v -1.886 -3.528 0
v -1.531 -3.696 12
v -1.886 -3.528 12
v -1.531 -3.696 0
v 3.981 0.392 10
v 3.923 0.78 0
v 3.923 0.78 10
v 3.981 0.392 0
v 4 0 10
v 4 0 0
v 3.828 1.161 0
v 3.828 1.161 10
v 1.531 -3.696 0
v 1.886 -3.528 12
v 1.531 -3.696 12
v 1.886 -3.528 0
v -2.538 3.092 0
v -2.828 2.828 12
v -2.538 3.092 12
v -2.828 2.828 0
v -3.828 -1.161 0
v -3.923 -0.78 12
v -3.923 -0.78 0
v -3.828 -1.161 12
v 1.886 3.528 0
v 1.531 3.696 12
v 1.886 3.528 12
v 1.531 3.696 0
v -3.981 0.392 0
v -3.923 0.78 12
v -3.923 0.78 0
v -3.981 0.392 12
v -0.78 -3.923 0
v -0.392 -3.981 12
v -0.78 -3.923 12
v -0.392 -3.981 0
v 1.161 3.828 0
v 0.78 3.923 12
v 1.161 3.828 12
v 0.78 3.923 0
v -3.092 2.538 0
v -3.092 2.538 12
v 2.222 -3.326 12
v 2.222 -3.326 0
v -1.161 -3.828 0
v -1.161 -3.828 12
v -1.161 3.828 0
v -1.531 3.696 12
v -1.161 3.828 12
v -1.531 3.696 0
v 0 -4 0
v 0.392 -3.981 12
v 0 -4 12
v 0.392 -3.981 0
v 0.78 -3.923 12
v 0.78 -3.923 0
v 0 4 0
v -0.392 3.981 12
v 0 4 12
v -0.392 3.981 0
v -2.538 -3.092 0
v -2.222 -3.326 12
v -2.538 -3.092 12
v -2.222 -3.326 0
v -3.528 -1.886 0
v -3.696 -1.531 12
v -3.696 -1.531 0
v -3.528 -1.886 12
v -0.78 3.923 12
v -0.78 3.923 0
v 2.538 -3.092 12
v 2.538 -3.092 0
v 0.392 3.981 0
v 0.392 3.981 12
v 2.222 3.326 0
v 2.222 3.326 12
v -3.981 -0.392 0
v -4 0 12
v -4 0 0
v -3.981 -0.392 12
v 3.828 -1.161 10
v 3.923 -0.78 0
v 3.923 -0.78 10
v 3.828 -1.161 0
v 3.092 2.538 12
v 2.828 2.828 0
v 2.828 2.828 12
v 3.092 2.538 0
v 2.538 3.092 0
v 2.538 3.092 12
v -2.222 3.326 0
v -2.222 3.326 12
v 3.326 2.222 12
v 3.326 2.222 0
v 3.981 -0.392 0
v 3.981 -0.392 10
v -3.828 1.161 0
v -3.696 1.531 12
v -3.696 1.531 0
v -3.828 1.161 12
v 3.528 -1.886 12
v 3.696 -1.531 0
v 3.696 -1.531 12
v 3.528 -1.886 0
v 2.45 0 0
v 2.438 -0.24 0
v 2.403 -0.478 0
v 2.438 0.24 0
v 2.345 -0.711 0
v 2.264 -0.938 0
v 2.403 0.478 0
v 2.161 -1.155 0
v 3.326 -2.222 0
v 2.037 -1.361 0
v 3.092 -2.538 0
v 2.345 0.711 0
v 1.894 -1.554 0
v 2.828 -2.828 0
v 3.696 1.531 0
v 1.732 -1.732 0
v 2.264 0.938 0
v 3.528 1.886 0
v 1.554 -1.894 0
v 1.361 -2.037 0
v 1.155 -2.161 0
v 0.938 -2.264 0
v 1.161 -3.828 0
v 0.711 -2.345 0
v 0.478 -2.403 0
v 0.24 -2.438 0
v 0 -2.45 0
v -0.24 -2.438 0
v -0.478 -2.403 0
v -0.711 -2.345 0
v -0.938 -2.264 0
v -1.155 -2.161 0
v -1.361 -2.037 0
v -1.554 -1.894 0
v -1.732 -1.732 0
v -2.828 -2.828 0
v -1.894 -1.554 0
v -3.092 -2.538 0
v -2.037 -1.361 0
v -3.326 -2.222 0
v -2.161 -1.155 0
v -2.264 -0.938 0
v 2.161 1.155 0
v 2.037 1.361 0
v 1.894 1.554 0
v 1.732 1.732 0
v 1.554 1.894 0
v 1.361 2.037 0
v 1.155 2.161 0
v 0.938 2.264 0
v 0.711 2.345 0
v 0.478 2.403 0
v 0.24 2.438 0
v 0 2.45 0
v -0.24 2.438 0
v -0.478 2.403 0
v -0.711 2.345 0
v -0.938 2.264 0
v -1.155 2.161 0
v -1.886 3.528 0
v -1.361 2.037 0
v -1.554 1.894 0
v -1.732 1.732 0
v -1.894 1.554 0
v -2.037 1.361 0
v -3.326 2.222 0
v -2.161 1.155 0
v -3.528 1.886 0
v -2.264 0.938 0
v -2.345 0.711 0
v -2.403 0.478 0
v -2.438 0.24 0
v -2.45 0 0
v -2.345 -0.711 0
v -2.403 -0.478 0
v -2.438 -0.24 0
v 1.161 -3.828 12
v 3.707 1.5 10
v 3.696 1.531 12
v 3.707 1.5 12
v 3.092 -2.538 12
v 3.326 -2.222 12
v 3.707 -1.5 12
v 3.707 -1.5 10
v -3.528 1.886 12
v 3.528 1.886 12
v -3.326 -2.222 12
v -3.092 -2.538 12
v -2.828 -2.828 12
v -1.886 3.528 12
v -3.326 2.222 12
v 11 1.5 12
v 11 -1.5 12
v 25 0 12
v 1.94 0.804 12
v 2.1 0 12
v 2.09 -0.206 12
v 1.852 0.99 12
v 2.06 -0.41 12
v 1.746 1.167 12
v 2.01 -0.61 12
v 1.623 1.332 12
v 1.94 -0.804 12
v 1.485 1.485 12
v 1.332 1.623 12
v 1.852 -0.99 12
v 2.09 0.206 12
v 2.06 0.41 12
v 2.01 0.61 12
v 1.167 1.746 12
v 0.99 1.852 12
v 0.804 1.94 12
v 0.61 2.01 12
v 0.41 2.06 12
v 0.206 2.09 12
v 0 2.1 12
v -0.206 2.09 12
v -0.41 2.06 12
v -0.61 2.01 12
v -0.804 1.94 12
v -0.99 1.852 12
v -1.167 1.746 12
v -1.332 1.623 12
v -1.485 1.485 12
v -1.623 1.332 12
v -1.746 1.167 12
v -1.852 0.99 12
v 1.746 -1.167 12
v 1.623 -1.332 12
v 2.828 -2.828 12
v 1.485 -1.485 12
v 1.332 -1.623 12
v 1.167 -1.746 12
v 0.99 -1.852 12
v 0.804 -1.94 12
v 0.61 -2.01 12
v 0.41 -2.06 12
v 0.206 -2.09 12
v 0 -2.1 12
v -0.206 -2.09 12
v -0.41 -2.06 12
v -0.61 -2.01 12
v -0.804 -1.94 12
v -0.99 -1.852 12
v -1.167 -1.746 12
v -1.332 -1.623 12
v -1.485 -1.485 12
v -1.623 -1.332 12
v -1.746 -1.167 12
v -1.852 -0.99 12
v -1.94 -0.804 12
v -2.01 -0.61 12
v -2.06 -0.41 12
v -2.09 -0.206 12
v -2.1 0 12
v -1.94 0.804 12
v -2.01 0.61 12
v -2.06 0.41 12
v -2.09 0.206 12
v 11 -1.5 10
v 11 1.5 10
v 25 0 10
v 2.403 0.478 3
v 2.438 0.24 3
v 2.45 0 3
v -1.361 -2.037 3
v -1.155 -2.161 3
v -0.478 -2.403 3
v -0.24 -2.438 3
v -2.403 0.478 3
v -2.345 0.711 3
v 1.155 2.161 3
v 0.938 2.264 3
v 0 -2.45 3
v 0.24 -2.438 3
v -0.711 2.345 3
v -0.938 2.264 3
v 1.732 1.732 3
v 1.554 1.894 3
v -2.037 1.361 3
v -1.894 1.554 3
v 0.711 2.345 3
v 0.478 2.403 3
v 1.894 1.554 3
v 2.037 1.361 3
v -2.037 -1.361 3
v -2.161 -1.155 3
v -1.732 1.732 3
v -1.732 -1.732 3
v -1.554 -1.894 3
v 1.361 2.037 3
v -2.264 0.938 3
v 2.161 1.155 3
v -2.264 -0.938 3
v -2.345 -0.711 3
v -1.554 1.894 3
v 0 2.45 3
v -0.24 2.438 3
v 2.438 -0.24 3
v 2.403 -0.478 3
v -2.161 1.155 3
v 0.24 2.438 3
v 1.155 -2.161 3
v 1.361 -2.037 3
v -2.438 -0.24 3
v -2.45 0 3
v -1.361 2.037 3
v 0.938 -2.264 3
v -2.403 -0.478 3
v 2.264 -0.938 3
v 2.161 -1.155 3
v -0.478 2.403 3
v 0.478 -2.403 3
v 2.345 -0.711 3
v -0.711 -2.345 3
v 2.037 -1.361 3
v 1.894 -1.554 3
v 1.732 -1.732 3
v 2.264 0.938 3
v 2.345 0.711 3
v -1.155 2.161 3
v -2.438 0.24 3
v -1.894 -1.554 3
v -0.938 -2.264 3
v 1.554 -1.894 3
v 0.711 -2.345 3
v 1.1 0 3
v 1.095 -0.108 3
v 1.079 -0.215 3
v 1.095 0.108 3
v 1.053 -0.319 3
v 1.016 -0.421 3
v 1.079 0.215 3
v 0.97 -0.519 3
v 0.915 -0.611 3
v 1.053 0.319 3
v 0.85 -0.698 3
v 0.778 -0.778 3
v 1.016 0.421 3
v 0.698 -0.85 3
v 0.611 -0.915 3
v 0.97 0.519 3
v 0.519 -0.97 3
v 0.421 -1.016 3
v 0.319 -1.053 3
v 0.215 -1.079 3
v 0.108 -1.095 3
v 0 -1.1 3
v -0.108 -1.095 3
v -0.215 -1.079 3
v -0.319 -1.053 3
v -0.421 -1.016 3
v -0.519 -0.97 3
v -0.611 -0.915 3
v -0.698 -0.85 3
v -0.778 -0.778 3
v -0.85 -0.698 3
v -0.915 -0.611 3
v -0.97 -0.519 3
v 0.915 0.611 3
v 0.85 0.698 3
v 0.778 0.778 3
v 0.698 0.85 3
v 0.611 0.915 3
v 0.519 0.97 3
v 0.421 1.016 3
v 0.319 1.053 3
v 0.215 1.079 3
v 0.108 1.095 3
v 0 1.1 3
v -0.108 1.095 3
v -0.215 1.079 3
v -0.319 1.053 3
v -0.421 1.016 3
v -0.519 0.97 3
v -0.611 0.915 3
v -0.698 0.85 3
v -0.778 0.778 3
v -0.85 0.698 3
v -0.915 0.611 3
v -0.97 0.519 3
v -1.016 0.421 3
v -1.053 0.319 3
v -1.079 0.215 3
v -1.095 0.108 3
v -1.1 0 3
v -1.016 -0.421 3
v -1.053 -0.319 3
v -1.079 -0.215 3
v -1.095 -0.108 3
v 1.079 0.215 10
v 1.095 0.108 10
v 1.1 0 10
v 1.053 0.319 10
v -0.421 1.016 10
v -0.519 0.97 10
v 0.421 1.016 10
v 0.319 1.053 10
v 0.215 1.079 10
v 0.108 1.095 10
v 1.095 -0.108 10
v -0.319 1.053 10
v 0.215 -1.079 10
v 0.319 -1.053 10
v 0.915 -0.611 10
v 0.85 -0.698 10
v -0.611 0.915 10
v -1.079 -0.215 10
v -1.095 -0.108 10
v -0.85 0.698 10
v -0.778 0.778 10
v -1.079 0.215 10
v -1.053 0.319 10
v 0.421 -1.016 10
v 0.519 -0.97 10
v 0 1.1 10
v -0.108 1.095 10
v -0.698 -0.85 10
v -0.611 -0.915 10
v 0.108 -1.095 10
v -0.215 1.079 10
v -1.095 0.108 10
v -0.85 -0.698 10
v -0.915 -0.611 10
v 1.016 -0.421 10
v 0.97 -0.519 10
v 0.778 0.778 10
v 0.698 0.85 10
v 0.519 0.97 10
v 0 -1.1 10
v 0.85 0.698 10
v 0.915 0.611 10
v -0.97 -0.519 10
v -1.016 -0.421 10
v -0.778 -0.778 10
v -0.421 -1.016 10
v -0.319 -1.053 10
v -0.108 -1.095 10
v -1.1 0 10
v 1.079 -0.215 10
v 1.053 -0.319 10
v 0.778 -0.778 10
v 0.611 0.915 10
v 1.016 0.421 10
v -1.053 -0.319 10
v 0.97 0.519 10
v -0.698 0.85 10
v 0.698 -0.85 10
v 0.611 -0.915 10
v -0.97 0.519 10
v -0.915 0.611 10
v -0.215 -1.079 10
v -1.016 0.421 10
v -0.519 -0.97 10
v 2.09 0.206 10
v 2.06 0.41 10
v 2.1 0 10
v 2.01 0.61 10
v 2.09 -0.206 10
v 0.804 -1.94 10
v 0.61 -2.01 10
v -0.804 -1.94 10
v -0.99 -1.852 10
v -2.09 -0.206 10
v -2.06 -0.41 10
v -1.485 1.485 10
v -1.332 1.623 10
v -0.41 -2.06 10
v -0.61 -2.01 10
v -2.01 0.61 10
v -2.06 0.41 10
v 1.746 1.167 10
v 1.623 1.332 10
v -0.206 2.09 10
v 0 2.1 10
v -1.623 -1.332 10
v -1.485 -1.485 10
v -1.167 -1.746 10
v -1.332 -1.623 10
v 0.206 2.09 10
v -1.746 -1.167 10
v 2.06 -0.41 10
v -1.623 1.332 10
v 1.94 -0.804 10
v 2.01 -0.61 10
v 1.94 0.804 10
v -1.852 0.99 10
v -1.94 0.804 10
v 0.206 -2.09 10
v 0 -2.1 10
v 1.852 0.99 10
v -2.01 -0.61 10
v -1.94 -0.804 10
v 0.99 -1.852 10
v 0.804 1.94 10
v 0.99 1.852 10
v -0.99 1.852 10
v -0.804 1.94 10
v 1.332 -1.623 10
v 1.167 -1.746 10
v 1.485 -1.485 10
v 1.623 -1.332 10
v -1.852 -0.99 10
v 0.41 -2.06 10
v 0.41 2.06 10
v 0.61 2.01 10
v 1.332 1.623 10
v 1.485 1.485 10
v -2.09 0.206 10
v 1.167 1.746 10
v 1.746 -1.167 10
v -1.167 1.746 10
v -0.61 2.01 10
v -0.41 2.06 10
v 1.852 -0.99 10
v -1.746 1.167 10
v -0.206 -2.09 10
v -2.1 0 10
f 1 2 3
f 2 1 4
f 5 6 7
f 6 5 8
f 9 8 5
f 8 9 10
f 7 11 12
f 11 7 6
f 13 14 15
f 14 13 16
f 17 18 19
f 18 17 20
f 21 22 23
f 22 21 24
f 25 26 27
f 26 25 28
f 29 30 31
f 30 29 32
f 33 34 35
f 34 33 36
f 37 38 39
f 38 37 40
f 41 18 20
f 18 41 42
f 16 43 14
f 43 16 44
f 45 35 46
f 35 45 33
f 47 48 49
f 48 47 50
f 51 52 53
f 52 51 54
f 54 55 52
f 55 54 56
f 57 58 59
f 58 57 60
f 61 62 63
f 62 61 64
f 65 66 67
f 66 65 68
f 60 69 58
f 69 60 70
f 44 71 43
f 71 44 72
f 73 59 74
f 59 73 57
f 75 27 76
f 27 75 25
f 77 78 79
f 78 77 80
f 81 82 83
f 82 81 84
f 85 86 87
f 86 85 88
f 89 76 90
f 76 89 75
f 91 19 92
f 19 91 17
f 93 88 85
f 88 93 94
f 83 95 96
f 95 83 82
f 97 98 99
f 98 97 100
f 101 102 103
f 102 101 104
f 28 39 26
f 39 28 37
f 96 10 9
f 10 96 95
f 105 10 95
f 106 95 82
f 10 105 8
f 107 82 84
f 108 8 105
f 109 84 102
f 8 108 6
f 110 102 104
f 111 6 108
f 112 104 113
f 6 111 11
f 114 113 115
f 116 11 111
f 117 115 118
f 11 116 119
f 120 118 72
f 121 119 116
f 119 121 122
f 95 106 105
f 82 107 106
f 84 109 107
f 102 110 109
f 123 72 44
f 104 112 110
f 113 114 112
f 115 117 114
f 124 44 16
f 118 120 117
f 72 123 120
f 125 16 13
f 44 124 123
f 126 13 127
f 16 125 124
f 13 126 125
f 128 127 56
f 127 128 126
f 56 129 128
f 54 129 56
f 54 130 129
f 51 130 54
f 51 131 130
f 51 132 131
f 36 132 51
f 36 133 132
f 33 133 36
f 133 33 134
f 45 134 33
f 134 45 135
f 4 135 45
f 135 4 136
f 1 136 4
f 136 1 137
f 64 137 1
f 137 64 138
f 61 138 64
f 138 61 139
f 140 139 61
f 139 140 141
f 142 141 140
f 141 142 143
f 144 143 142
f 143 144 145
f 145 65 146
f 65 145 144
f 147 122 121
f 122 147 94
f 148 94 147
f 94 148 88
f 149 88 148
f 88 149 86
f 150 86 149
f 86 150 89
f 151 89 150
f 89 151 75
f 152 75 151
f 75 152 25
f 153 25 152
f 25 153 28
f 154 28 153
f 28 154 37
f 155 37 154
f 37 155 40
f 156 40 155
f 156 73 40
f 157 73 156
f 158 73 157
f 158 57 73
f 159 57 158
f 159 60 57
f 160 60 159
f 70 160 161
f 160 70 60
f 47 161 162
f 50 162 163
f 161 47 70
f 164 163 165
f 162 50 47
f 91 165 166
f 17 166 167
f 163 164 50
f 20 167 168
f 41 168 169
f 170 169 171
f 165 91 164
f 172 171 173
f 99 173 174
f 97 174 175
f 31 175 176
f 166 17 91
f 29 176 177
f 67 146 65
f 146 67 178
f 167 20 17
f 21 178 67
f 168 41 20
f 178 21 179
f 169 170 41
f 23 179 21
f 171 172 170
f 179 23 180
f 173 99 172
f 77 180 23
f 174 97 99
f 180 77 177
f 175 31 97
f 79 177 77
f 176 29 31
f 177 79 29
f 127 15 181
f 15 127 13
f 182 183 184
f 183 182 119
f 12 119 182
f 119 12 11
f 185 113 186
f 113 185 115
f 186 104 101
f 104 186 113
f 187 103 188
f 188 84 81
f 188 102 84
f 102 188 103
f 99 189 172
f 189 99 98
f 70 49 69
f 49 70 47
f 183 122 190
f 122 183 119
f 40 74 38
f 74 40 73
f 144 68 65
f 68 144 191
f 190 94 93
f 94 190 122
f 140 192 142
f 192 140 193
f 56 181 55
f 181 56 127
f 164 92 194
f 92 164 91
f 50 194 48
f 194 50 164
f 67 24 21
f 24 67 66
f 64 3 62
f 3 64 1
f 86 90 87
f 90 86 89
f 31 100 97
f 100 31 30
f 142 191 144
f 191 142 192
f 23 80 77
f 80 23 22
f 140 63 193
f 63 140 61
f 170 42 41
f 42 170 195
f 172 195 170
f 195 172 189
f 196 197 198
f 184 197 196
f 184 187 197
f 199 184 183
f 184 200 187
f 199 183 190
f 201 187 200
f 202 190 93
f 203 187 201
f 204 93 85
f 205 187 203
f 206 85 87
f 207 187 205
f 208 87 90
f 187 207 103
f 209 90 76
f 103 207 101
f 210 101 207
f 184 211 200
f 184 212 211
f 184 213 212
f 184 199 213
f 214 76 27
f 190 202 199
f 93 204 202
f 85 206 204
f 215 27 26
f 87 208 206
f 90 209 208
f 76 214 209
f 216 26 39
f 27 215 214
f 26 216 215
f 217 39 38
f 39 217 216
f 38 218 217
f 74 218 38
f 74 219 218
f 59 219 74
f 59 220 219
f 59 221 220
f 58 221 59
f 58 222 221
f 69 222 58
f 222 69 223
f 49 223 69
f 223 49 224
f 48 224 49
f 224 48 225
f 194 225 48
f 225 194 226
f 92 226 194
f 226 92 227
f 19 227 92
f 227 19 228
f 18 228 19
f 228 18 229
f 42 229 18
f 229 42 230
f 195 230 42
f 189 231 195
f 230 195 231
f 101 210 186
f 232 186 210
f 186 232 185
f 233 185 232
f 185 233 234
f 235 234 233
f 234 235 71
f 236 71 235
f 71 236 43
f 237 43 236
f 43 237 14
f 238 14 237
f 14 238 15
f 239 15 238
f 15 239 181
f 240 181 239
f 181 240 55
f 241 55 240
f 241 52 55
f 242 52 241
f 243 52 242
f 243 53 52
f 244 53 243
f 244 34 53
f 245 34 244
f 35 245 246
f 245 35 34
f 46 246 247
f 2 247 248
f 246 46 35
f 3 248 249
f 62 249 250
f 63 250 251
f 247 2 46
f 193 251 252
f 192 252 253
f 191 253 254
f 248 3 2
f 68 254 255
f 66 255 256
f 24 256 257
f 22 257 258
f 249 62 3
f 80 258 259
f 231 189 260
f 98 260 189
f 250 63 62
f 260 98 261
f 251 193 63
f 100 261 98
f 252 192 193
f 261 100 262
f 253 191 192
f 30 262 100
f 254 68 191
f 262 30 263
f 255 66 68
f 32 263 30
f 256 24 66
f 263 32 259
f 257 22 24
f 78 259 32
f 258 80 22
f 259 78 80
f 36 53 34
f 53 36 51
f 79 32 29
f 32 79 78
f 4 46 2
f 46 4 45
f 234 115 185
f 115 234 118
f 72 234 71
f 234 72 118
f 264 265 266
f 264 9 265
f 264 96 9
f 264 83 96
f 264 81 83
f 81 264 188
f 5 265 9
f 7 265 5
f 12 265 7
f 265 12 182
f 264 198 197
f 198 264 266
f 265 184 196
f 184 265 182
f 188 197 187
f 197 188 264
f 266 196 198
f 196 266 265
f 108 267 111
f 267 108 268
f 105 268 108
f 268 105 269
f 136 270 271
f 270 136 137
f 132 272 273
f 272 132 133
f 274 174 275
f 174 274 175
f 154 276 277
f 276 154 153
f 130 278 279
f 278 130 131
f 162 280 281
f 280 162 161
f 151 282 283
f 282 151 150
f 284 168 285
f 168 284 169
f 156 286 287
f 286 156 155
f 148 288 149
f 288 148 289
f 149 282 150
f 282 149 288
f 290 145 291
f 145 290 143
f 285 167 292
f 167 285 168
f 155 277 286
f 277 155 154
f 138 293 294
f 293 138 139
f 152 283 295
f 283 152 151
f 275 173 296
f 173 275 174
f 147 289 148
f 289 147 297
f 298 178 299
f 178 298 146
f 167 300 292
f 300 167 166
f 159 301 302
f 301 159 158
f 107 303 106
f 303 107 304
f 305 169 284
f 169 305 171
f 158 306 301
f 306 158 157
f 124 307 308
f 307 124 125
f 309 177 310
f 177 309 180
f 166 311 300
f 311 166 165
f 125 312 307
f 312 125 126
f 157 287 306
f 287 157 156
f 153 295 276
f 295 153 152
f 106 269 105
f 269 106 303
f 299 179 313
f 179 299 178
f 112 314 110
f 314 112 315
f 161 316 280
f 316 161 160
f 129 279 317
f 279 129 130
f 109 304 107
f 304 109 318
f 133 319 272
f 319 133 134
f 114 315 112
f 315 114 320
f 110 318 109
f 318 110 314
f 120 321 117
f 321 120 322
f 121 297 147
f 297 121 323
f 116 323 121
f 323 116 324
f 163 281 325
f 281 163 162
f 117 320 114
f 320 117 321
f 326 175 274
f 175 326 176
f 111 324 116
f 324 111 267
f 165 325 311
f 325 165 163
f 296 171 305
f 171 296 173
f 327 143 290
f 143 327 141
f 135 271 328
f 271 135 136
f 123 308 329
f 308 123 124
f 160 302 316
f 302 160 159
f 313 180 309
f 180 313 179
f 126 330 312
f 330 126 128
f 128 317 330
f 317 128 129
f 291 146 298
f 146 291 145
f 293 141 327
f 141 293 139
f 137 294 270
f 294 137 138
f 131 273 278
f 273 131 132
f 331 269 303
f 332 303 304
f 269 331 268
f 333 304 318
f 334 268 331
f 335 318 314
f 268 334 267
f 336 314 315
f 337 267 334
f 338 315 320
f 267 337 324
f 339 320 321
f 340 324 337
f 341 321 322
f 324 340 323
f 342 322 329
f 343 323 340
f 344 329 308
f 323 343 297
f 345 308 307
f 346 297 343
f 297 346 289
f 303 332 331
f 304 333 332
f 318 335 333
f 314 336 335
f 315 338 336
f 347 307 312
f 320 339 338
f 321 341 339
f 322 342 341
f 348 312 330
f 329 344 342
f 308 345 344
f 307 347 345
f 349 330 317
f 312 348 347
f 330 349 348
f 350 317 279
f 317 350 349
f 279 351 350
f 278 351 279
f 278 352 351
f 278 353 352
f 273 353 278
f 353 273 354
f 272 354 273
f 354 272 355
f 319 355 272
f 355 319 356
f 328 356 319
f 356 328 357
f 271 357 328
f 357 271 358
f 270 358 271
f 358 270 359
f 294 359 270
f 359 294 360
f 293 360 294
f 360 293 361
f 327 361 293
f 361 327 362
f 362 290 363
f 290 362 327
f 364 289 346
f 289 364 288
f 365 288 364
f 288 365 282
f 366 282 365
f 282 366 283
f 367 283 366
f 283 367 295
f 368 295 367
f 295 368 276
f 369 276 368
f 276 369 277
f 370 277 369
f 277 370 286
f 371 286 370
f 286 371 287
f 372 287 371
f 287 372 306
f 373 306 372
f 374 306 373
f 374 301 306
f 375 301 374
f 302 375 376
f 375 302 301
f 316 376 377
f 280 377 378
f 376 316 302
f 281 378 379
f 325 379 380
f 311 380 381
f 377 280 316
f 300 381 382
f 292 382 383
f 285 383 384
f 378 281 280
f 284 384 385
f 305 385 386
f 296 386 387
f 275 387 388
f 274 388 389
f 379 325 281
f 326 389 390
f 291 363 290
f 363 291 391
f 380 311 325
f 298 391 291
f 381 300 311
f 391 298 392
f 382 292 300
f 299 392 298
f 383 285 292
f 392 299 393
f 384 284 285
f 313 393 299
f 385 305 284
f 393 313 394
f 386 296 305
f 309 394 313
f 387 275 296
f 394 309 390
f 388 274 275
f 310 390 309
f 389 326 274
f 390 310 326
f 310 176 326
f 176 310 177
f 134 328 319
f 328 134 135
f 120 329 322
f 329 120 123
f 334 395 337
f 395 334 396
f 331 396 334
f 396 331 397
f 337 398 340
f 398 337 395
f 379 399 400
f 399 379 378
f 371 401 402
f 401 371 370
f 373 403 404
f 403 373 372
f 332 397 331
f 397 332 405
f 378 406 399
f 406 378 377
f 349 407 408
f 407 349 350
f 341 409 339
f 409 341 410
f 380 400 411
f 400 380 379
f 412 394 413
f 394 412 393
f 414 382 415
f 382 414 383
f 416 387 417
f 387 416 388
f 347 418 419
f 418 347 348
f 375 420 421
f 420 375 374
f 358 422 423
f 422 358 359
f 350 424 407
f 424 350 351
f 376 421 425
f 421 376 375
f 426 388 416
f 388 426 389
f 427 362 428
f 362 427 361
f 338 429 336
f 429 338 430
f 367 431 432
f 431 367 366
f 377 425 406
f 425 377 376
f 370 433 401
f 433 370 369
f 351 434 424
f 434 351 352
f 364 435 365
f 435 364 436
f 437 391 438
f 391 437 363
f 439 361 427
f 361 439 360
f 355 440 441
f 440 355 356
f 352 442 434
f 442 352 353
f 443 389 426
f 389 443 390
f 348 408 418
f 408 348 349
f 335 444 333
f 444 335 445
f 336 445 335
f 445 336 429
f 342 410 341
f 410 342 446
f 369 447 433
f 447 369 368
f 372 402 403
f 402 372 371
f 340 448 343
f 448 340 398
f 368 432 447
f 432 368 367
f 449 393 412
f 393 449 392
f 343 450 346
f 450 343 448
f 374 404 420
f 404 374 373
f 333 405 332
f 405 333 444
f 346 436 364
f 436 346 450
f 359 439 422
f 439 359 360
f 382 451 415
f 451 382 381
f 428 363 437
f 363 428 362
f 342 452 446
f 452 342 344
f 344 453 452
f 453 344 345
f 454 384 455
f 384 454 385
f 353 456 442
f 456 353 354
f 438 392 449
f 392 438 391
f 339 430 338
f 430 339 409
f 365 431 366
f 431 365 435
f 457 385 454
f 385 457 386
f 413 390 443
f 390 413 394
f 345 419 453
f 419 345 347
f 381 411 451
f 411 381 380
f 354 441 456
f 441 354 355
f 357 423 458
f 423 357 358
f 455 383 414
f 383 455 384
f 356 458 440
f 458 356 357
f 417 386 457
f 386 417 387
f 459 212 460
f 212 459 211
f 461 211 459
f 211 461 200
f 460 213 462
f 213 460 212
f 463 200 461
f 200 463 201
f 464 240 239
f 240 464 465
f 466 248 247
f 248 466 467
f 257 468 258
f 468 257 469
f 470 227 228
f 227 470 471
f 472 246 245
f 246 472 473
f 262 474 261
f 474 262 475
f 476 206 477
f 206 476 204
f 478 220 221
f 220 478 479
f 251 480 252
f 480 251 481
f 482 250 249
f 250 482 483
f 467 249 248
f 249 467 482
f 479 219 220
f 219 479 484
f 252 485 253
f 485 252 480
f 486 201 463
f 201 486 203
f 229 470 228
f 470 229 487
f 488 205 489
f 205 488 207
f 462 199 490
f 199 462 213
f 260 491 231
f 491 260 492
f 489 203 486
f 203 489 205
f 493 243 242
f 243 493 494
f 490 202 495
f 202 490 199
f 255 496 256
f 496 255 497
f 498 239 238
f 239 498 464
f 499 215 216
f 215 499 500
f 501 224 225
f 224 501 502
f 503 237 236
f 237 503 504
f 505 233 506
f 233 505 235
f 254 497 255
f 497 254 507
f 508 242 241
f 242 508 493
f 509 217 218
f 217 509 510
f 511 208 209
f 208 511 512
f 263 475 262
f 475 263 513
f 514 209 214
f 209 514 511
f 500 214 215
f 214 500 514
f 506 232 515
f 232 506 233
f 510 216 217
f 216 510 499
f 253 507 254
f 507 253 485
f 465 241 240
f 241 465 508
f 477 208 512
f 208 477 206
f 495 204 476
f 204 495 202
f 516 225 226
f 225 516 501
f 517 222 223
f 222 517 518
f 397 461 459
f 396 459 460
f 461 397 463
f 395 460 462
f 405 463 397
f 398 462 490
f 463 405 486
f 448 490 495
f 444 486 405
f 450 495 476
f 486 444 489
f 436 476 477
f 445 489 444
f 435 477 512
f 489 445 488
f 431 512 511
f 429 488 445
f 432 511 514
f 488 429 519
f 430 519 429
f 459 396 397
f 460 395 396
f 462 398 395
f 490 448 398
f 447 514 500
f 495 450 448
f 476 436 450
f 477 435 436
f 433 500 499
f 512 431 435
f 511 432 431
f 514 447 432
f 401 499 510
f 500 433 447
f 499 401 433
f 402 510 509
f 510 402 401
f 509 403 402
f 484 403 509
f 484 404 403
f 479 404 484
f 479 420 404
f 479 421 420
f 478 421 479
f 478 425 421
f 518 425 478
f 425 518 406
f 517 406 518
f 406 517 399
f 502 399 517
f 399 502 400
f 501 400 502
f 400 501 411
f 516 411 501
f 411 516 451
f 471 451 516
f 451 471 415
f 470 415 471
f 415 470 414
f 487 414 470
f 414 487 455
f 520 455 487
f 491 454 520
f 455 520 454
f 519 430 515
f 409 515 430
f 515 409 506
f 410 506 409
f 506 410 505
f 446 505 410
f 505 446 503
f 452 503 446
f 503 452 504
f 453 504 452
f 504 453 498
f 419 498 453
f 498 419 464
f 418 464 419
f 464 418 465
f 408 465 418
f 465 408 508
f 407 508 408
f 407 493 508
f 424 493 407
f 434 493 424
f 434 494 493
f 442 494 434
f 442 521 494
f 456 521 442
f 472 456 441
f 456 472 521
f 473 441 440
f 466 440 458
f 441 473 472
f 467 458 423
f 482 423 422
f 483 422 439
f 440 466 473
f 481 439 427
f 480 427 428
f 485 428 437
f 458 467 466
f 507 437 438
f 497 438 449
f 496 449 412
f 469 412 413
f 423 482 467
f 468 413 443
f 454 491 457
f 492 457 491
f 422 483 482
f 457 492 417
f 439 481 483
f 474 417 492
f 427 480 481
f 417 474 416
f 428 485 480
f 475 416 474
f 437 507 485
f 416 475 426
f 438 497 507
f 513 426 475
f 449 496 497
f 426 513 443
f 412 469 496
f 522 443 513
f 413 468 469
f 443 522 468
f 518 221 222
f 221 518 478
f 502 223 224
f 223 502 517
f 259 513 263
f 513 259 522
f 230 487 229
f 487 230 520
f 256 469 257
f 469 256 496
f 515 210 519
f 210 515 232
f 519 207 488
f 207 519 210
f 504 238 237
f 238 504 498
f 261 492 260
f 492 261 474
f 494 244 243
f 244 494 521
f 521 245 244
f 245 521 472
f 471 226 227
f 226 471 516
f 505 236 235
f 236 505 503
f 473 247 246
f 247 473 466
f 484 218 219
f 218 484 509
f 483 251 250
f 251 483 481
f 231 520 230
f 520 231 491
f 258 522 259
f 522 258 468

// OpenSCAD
// Tall gauge needle horn for an SG90-style micro servo.
// Designed as a direct-fit prototype using the servo's original centre screw.
// Test the spline_socket_diameter with a short print before printing the full part.
// Dimensions are in millimetres.

hub_diameter = 8;
hub_height = 12;
socket_diameter = 4.9;
socket_depth = 3;
centre_screw_diameter = 2.2;
screw_head_diameter = 4.2;
screw_head_depth = 2;

needle_length = 25;
needle_width = 3;
needle_thickness = 2;
needle_tip_length = 14;
facet_count = 64;

$fn = facet_count;

difference() {
    union() {
        cylinder(d = hub_diameter, h = hub_height);

        translate([0, 0, hub_height - needle_thickness])
            linear_extrude(height = needle_thickness)
                polygon(points = [
                    [0, -needle_width / 2],
                    [needle_length - needle_tip_length, -needle_width / 2],
                    [needle_length, 0],
                    [needle_length - needle_tip_length, needle_width / 2],
                    [0, needle_width / 2]
                ]);
    }

    // Smooth socket for the SG90 output spline; adjust after a test fit.
    translate([0, 0, -0.1])
        cylinder(d = socket_diameter, h = socket_depth + 0.1);

    // Original SG90 centre screw passes through this hole.
    translate([0, 0, -0.1])
        cylinder(d = centre_screw_diameter, h = hub_height + 0.2);

    // Recesses the screw head so it does not protrude above the hub.
    translate([0, 0, hub_height - screw_head_depth])
        cylinder(d = screw_head_diameter, h = screw_head_depth + 0.1);
}
